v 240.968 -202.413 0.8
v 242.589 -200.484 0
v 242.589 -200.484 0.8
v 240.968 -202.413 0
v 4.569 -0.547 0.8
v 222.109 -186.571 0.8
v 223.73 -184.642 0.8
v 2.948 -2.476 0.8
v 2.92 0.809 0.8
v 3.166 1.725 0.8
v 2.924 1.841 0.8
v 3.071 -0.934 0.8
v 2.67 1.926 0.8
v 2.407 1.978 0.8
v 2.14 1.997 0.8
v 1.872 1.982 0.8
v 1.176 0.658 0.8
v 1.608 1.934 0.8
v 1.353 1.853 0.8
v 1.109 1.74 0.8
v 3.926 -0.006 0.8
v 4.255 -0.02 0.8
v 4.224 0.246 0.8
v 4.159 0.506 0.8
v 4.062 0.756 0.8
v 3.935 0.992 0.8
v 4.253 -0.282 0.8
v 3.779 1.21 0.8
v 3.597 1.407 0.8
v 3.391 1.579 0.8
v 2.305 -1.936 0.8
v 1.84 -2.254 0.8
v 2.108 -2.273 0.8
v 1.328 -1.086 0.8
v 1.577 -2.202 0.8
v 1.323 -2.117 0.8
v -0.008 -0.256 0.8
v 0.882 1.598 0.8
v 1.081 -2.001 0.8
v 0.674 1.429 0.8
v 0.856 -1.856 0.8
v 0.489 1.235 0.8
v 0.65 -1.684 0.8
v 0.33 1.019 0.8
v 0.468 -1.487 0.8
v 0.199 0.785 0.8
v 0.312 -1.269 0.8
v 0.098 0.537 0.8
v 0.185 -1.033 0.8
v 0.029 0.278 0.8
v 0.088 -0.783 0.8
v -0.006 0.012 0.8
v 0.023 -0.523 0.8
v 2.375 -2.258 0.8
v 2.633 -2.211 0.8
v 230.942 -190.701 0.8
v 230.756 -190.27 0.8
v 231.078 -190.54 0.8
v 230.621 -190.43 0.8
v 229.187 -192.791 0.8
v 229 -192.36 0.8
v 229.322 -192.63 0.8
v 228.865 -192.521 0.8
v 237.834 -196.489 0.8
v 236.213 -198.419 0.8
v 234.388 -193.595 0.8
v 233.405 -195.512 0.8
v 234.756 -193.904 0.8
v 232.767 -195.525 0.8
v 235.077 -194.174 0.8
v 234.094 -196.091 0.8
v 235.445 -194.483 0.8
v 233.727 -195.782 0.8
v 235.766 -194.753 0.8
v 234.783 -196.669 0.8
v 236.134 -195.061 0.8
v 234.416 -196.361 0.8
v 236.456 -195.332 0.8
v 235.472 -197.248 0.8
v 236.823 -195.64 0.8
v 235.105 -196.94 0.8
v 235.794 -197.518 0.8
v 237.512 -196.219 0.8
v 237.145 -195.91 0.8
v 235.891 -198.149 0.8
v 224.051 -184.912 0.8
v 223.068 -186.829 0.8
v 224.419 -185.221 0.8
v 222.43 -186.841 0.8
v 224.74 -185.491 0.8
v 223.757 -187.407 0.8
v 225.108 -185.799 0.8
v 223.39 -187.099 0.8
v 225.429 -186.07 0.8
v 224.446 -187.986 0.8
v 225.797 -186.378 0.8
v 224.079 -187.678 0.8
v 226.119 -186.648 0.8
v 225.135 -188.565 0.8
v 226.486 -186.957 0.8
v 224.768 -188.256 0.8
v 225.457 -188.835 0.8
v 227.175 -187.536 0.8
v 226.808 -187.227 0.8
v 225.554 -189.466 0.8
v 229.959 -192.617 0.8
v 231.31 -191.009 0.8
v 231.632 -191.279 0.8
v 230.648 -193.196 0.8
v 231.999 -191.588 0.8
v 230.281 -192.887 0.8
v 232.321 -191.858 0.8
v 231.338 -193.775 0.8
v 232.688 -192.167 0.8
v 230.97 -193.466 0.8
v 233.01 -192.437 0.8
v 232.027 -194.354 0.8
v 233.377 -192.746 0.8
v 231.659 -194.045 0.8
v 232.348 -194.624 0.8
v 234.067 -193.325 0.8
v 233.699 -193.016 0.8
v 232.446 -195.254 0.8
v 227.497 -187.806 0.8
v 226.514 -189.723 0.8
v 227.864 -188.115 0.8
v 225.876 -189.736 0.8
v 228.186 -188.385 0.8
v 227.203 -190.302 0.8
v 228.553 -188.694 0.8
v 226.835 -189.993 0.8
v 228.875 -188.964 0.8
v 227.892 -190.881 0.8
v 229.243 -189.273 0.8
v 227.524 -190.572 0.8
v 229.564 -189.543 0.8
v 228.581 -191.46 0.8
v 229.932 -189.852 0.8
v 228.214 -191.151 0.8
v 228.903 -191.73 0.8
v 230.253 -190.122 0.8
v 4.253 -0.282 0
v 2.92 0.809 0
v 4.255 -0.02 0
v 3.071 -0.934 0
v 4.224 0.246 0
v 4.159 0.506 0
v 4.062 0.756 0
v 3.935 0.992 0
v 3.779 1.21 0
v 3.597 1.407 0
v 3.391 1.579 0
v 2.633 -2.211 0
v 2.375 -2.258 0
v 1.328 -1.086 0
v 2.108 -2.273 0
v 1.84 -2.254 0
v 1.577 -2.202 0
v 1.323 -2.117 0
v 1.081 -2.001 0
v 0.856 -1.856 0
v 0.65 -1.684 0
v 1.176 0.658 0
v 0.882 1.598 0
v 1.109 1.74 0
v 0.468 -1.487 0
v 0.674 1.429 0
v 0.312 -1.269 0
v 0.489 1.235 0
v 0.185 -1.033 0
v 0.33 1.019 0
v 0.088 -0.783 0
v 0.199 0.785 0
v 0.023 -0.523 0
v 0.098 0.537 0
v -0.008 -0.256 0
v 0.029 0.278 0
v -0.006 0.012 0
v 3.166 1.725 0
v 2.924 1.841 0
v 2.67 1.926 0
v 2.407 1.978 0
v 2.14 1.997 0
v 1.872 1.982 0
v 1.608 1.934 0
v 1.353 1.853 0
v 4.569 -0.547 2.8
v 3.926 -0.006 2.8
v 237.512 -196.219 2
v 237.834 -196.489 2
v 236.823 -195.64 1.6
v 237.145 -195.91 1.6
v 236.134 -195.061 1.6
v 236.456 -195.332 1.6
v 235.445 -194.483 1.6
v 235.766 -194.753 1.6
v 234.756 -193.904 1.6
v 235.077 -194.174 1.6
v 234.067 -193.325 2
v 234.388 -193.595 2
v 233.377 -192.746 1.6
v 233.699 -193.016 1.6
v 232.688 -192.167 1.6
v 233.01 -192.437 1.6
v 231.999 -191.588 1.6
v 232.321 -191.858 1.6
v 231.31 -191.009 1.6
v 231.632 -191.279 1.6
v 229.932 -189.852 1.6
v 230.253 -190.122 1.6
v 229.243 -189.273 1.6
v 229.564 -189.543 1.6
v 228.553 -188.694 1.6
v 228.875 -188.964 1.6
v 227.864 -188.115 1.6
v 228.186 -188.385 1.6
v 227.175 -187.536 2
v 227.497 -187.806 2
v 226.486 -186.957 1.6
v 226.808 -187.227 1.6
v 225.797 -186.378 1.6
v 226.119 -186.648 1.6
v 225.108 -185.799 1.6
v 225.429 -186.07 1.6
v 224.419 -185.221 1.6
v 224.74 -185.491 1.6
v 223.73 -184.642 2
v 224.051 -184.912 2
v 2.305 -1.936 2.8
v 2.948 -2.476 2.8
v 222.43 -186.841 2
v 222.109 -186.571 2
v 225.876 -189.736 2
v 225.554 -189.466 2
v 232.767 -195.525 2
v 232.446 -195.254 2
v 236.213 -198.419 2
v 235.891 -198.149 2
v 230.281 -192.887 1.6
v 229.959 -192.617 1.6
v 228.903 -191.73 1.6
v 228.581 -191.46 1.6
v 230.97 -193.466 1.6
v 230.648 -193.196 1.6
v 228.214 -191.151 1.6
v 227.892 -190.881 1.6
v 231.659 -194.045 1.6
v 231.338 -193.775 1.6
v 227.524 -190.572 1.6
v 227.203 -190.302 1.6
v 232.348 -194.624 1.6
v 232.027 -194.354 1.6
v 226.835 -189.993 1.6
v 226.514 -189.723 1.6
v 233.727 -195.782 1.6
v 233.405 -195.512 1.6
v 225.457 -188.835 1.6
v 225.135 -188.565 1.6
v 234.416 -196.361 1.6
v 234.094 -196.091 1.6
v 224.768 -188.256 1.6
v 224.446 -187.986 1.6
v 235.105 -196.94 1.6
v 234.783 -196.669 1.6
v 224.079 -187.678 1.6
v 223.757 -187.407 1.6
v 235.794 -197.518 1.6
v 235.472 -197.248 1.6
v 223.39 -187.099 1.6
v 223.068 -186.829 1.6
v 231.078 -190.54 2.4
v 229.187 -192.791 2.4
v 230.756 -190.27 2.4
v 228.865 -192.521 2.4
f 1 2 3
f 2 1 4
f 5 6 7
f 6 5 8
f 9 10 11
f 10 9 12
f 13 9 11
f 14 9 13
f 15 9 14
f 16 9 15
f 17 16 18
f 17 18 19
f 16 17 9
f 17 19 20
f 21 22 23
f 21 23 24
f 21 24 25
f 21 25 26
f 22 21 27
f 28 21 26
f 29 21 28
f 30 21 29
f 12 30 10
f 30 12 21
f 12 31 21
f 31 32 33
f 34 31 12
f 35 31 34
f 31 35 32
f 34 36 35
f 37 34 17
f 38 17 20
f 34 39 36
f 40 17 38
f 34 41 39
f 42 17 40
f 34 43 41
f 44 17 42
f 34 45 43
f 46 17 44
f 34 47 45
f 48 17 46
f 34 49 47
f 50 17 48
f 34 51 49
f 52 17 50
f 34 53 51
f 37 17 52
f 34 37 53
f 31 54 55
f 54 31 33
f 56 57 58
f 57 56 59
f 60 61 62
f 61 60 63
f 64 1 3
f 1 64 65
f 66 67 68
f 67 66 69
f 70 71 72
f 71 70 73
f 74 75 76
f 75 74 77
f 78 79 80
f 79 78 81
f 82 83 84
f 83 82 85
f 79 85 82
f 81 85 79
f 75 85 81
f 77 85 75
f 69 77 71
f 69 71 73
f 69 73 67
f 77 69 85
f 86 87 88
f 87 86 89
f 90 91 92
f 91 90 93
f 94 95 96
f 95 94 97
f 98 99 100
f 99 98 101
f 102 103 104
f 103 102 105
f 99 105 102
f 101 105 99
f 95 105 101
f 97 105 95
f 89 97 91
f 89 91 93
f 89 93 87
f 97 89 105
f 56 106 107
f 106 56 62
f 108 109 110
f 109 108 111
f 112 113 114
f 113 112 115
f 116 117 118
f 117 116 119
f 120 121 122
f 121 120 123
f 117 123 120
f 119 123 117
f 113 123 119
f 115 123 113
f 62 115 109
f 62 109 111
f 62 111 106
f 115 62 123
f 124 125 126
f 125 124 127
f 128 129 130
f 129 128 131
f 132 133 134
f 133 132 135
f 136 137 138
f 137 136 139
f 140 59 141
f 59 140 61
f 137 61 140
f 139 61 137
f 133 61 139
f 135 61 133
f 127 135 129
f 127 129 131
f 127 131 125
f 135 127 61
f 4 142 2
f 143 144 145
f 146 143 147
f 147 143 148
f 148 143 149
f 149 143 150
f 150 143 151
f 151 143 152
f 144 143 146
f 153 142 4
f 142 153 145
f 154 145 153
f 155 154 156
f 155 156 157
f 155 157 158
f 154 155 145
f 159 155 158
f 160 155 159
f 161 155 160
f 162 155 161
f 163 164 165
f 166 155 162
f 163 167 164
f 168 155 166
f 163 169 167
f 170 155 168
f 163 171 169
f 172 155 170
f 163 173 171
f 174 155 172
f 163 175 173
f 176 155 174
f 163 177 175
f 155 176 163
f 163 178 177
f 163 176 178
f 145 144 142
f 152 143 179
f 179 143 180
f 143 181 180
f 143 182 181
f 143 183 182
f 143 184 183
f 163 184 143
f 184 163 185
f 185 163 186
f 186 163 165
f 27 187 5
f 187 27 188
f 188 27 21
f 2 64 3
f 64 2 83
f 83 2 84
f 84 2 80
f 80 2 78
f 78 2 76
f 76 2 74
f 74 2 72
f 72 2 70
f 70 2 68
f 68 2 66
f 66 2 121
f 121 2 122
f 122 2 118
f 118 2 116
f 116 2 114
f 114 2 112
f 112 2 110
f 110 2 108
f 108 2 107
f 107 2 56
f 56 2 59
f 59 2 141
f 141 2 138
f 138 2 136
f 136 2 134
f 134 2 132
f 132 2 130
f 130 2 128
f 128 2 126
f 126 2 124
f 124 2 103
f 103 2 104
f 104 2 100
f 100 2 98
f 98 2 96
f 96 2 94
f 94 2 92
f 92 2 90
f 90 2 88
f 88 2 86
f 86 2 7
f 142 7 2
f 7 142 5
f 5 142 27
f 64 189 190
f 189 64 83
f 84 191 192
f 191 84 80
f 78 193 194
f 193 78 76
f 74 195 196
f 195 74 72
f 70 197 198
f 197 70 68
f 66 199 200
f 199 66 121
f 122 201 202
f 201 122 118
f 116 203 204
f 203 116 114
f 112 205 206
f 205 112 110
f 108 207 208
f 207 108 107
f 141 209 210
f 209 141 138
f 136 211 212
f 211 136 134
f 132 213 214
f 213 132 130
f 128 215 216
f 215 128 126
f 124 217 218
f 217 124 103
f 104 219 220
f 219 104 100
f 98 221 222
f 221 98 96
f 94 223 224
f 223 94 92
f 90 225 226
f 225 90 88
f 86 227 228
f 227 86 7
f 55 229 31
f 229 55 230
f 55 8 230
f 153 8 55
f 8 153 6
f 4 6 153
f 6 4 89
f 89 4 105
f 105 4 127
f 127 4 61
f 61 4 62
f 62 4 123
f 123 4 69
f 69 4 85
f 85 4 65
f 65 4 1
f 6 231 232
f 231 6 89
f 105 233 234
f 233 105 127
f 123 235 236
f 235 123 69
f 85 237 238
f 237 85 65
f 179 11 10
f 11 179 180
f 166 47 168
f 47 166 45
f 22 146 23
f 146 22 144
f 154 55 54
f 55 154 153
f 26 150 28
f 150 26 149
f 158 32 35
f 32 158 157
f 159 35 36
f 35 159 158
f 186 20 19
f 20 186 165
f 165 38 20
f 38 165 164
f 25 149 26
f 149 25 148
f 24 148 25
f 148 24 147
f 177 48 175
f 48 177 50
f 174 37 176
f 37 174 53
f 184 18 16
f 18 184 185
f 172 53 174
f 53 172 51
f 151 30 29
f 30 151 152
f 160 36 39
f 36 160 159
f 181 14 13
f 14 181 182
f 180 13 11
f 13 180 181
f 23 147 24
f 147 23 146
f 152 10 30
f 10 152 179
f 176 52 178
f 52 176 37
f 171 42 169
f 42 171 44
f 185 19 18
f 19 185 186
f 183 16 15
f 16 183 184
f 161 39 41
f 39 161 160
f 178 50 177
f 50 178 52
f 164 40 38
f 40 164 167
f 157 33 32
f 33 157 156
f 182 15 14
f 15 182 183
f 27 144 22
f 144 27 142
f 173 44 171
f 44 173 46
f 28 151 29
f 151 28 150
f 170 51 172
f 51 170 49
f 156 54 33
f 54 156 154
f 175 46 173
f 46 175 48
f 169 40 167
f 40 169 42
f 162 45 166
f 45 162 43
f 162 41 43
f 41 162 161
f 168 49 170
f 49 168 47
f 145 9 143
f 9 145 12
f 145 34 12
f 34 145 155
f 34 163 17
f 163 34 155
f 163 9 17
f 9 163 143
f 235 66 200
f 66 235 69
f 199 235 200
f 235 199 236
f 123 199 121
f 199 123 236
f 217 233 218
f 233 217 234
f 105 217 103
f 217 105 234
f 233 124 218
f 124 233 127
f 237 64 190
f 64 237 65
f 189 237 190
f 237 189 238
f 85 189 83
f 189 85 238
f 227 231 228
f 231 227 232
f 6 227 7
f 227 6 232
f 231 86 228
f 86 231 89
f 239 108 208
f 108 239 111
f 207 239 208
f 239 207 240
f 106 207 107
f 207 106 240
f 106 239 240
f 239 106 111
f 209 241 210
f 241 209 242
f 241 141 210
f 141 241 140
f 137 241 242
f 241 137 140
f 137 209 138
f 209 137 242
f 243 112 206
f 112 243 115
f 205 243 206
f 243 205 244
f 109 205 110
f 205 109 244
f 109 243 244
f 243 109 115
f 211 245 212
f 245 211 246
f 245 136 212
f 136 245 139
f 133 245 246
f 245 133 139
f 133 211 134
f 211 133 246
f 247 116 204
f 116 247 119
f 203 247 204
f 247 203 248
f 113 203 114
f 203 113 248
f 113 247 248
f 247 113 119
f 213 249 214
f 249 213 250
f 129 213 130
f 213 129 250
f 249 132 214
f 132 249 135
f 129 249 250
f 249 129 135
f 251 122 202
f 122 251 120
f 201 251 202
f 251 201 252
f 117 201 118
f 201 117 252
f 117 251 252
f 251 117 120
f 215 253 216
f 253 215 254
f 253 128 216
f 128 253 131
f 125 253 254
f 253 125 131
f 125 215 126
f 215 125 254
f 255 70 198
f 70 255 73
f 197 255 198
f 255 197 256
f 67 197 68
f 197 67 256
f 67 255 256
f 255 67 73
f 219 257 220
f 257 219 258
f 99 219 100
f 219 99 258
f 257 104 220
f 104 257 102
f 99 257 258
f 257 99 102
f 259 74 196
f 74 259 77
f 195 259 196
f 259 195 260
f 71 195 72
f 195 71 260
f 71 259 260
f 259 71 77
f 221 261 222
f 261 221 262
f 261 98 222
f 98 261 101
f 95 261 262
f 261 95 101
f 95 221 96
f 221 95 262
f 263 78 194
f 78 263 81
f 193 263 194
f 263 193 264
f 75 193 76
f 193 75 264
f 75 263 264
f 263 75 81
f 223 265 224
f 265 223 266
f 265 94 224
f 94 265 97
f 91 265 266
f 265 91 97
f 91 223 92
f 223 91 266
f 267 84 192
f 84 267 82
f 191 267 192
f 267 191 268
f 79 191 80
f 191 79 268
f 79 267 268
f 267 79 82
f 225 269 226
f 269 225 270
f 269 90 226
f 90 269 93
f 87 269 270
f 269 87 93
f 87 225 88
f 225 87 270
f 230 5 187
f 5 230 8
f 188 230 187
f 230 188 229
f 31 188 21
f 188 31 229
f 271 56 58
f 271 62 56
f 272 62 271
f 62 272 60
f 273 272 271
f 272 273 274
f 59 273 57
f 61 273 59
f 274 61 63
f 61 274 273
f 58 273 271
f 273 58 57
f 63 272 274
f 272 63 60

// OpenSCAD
// model: Bed XY Skew Calibration Strips
//        Generates calibration strips that allow you to determine approximate level of skew in XY axes for 3D printers with Cartesian gantry systems.
// filename: bedSkewCalibration-fiveangle.scad
// original: http://www.thingiverse.com/thing:1873549
// author: fiveangle@gmail.com
// date: 2016nov05
// ver: 0.9.1
// notes: Set generateOrthogonalBisector to "True" to generate second calibration strip. Insert a segment of filament into the hole end of printed calibration strip to align them; read the resulting skew on the vernier scale on the other end. If center marks are aligned, XY axes are square within the resolution of your extrusion width.  If they are off.  Adjust, wash, rinse, repeat. I'll probably update again shortly, so please send me bugfixes/improvement (and your history entry) if you wish, and I will incorporate/atribute.
// printing notes:
//     * Perform all other normal calibrations first (decent summary here: https://www.3dhubs.com/talk/thread/howto-calibrate-tune-and-fine-tune-your-printer-and-filament)
//     * Print with one shell
//     * Print with PLA
//     * Print with lowest temperature possible
//     * If printing on heated bed, wait for bed to get close to room temperature before removing print
//     * Use a filament color with good reflectivity for easiest reading of vernier scale (silver, for example). 
// todo: Fix scaling for greater than 1mm, add math to maximumize available bed length, currently testing different methods to produce clearer verniers
// history:
//     -0.9.1 - 2016nov12 - fiveangle@gmail.com - Fixed Customizer bugs:
//                                                    - apparently Customizer doesn't work with Boolean value/comment pairs
//                                                    - fixed filamentDiameter Customizer value/comment pairs transposed
//                                              - Changed maximumSkew math to account for +1 value of vernier for 
//                                              - Reduced maximum skew from 11mm to 6mm (if your bed is more than that, you got problems :)
//                                              - Fixed 3mm filament diameter to the true value of 2.85mm (I've never owned a printer that used it myself)
//
//     -0.9.0 - 2016nov05 - fiveangle@gmail.com - Released on thingiverse in order to facilitate ongoing XY calbiration discussion at https://github.com/MarlinFirmware/Marlin/issues/5116

// adjust to increase/decrease polygon count at expense of processing time (above 100 is probably useless)
$fn = 50;
bedX = 250;
bedY = 210;

// Which diagonal to make (you need to generate one of each) ?
generateOrthogonalBisector = 1; // [0:XY Bisector Diagonal, 1:XY Orthogonal Diagonal]

filamentDiameter = 1.75; // [1.75:1.75mm, 2.85:2.85mm]

// Should be at least the Extrusion Width set in your slicer or the measurement marks will not print. +0.02 to +0.04 mm seems to work well to allow most slicers to generate correct markings
extrusionWidth = 0.42;
layerHeight = 0.2;
stripWidth = 6 * extrusionWidth;
stripHeight = 4 * layerHeight;

// Math to auto-adjust for spacing other than 1 extrusion width is not implemented yet so this currently works for only "1"
scaleSpacing = 1;

originAlignmentSpacing = 4; 

bufferLength = 2 * stripWidth; // to ensure we don't run out of bed. With new alignment method of using a piece of filament, probably need to make this calculation more rigorous to support all printers (e.g. ones with 1.2mm nozzles, etc) but this should be enough for most typical printers, while still using most of the bed to get highest accuracy.

// WARNING: Calibration strip length will be optimized to measure no more than this amount of skew between axes.  Set to as small as possible maximize the distance being measured accross your bed, but this should be no smaller than the maximum physical skew size possible.  If you are confident your printer is pretty square, feel free to drop this lower.  If you go too small on this value, there may not be enough measurement marks available on the XY bisector strip needed in order to read the vernier scale, so you'll have re-Customize setting this larger.
maximumSkew = 6;

// polyhole cylinder fitment method: http://hydraraptor.blogspot.com/2011/02/polyholes.html
module polyhole(h, d) {
    n = max(round(2 * d), 3);
    rotate([0, 0, 180])
    cylinder(h = h, r = (d / 2) / cos(180 / n), $fn = n);
}
bisectorLength = pow(pow(bedX - (maximumSkew-1), 2) + pow(bedY - (maximumSkew-1), 2), 1 / 2) - 2 * pow(2, 1 / 2) * 4 * extrusionWidth;

// output length of calibration strip to console during compile (for sanity check)
echo("bisectorLength", bisectorLength);

module calibrationStrip() {
    difference() {
        union() {
            // main strip
            translate([(filamentDiameter + 4 * extrusionWidth) / 2, 0, 0])
                cube([bisectorLength - (filamentDiameter + 4 * extrusionWidth) / 2, stripWidth, stripHeight]);
            translate([(4 * extrusionWidth + filamentDiameter) / 2, stripWidth / 2, 0])
                cylinder(d = filamentDiameter + extrusionWidth * 6, h = stripHeight);
        }
        translate([(4 * extrusionWidth + filamentDiameter) / 2, stripWidth / 2, 0])
            polyhole(stripHeight, filamentDiameter);
    }

    // alignment pins (now just a single one used for visual confirmation of filament method)
    for (i = [0])
        translate([originAlignmentSpacing * extrusionWidth * (i) + 3 * extrusionWidth + filamentDiameter, 0, stripHeight])
    cube([2 * extrusionWidth, stripWidth, 10 * layerHeight]);
    // abandoned alignment pin method that generated interlocking pins that would snap together, but it resulted in slight offsets - may revisit
    //for(i=[(generateOrthogonalBisector ? 1 : 0):4])
    //    translate([originAlignmentSpacing*extrusionWidth*(i)-(generateOrthogonalBisector ? extrusionWidth : 0),0,stripHeight])
    //        cube([extrusionWidth,stripWidth,3*layerHeight]);

    // center measure
    translate([bisectorLength - (20 + 2 * (maximumSkew-1)) / 2 - extrusionWidth - extrusionWidth / 2, -extrusionWidth / 2, stripHeight])
        cube([extrusionWidth, stripWidth + extrusionWidth, 8 * layerHeight]);

    // major measures
    for (i = [0: (10 + (generateOrthogonalBisector ? 0 : (maximumSkew-1))) / 5])
        translate([bisectorLength - (20 + 2 * (maximumSkew-1)) / 2 - extrusionWidth, 0, 0]) {
            translate([(generateOrthogonalBisector ? i * 0.9 * scaleSpacing * 5 : i * scaleSpacing * 5) - extrusionWidth / 2, 0, stripHeight])
                cube([extrusionWidth, stripWidth, 6 * layerHeight]);
            mirror([1, 0, 0]) // I first tried to nest a for loop to generate the other half of measures (and minor measures) but it didn't work so just copy/paste/mirror made quick work of it (in case it was an OpenSCAD issue) :)
                translate([(generateOrthogonalBisector ? i * 0.9 * scaleSpacing * 5 : i * scaleSpacing * 5) - extrusionWidth / 2, 0, stripHeight])
                    cube([extrusionWidth, stripWidth, 6 * layerHeight]);
        }

    // minor measures
    for (i = [0: (10 + (generateOrthogonalBisector ? 0 : (maximumSkew-1)))])
        translate([bisectorLength - (20 + 2 * (maximumSkew-1)) / 2 - extrusionWidth, 0, 0]) {
            translate([(generateOrthogonalBisector ? i * 0.9 * scaleSpacing : i * scaleSpacing) - extrusionWidth / 2, (generateOrthogonalBisector ? extrusionWidth : 0), stripHeight])
                cube([extrusionWidth, stripWidth - extrusionWidth, 4 * layerHeight]);
            mirror([1, 0, 0]) // ibid
                translate([(generateOrthogonalBisector ? i * 0.9 * scaleSpacing : i * scaleSpacing) - extrusionWidth / 2, (generateOrthogonalBisector ? extrusionWidth : 0), stripHeight])
                    cube([extrusionWidth, stripWidth - extrusionWidth, 4 * layerHeight]);
        }
}

rotate((generateOrthogonalBisector ? -1 : 1) * atan(bedY / bedX)) calibrationStrip(); // rotate model to correct angle since most slicers won't auto-center/align correctly for models longer than longest X or Y axis
